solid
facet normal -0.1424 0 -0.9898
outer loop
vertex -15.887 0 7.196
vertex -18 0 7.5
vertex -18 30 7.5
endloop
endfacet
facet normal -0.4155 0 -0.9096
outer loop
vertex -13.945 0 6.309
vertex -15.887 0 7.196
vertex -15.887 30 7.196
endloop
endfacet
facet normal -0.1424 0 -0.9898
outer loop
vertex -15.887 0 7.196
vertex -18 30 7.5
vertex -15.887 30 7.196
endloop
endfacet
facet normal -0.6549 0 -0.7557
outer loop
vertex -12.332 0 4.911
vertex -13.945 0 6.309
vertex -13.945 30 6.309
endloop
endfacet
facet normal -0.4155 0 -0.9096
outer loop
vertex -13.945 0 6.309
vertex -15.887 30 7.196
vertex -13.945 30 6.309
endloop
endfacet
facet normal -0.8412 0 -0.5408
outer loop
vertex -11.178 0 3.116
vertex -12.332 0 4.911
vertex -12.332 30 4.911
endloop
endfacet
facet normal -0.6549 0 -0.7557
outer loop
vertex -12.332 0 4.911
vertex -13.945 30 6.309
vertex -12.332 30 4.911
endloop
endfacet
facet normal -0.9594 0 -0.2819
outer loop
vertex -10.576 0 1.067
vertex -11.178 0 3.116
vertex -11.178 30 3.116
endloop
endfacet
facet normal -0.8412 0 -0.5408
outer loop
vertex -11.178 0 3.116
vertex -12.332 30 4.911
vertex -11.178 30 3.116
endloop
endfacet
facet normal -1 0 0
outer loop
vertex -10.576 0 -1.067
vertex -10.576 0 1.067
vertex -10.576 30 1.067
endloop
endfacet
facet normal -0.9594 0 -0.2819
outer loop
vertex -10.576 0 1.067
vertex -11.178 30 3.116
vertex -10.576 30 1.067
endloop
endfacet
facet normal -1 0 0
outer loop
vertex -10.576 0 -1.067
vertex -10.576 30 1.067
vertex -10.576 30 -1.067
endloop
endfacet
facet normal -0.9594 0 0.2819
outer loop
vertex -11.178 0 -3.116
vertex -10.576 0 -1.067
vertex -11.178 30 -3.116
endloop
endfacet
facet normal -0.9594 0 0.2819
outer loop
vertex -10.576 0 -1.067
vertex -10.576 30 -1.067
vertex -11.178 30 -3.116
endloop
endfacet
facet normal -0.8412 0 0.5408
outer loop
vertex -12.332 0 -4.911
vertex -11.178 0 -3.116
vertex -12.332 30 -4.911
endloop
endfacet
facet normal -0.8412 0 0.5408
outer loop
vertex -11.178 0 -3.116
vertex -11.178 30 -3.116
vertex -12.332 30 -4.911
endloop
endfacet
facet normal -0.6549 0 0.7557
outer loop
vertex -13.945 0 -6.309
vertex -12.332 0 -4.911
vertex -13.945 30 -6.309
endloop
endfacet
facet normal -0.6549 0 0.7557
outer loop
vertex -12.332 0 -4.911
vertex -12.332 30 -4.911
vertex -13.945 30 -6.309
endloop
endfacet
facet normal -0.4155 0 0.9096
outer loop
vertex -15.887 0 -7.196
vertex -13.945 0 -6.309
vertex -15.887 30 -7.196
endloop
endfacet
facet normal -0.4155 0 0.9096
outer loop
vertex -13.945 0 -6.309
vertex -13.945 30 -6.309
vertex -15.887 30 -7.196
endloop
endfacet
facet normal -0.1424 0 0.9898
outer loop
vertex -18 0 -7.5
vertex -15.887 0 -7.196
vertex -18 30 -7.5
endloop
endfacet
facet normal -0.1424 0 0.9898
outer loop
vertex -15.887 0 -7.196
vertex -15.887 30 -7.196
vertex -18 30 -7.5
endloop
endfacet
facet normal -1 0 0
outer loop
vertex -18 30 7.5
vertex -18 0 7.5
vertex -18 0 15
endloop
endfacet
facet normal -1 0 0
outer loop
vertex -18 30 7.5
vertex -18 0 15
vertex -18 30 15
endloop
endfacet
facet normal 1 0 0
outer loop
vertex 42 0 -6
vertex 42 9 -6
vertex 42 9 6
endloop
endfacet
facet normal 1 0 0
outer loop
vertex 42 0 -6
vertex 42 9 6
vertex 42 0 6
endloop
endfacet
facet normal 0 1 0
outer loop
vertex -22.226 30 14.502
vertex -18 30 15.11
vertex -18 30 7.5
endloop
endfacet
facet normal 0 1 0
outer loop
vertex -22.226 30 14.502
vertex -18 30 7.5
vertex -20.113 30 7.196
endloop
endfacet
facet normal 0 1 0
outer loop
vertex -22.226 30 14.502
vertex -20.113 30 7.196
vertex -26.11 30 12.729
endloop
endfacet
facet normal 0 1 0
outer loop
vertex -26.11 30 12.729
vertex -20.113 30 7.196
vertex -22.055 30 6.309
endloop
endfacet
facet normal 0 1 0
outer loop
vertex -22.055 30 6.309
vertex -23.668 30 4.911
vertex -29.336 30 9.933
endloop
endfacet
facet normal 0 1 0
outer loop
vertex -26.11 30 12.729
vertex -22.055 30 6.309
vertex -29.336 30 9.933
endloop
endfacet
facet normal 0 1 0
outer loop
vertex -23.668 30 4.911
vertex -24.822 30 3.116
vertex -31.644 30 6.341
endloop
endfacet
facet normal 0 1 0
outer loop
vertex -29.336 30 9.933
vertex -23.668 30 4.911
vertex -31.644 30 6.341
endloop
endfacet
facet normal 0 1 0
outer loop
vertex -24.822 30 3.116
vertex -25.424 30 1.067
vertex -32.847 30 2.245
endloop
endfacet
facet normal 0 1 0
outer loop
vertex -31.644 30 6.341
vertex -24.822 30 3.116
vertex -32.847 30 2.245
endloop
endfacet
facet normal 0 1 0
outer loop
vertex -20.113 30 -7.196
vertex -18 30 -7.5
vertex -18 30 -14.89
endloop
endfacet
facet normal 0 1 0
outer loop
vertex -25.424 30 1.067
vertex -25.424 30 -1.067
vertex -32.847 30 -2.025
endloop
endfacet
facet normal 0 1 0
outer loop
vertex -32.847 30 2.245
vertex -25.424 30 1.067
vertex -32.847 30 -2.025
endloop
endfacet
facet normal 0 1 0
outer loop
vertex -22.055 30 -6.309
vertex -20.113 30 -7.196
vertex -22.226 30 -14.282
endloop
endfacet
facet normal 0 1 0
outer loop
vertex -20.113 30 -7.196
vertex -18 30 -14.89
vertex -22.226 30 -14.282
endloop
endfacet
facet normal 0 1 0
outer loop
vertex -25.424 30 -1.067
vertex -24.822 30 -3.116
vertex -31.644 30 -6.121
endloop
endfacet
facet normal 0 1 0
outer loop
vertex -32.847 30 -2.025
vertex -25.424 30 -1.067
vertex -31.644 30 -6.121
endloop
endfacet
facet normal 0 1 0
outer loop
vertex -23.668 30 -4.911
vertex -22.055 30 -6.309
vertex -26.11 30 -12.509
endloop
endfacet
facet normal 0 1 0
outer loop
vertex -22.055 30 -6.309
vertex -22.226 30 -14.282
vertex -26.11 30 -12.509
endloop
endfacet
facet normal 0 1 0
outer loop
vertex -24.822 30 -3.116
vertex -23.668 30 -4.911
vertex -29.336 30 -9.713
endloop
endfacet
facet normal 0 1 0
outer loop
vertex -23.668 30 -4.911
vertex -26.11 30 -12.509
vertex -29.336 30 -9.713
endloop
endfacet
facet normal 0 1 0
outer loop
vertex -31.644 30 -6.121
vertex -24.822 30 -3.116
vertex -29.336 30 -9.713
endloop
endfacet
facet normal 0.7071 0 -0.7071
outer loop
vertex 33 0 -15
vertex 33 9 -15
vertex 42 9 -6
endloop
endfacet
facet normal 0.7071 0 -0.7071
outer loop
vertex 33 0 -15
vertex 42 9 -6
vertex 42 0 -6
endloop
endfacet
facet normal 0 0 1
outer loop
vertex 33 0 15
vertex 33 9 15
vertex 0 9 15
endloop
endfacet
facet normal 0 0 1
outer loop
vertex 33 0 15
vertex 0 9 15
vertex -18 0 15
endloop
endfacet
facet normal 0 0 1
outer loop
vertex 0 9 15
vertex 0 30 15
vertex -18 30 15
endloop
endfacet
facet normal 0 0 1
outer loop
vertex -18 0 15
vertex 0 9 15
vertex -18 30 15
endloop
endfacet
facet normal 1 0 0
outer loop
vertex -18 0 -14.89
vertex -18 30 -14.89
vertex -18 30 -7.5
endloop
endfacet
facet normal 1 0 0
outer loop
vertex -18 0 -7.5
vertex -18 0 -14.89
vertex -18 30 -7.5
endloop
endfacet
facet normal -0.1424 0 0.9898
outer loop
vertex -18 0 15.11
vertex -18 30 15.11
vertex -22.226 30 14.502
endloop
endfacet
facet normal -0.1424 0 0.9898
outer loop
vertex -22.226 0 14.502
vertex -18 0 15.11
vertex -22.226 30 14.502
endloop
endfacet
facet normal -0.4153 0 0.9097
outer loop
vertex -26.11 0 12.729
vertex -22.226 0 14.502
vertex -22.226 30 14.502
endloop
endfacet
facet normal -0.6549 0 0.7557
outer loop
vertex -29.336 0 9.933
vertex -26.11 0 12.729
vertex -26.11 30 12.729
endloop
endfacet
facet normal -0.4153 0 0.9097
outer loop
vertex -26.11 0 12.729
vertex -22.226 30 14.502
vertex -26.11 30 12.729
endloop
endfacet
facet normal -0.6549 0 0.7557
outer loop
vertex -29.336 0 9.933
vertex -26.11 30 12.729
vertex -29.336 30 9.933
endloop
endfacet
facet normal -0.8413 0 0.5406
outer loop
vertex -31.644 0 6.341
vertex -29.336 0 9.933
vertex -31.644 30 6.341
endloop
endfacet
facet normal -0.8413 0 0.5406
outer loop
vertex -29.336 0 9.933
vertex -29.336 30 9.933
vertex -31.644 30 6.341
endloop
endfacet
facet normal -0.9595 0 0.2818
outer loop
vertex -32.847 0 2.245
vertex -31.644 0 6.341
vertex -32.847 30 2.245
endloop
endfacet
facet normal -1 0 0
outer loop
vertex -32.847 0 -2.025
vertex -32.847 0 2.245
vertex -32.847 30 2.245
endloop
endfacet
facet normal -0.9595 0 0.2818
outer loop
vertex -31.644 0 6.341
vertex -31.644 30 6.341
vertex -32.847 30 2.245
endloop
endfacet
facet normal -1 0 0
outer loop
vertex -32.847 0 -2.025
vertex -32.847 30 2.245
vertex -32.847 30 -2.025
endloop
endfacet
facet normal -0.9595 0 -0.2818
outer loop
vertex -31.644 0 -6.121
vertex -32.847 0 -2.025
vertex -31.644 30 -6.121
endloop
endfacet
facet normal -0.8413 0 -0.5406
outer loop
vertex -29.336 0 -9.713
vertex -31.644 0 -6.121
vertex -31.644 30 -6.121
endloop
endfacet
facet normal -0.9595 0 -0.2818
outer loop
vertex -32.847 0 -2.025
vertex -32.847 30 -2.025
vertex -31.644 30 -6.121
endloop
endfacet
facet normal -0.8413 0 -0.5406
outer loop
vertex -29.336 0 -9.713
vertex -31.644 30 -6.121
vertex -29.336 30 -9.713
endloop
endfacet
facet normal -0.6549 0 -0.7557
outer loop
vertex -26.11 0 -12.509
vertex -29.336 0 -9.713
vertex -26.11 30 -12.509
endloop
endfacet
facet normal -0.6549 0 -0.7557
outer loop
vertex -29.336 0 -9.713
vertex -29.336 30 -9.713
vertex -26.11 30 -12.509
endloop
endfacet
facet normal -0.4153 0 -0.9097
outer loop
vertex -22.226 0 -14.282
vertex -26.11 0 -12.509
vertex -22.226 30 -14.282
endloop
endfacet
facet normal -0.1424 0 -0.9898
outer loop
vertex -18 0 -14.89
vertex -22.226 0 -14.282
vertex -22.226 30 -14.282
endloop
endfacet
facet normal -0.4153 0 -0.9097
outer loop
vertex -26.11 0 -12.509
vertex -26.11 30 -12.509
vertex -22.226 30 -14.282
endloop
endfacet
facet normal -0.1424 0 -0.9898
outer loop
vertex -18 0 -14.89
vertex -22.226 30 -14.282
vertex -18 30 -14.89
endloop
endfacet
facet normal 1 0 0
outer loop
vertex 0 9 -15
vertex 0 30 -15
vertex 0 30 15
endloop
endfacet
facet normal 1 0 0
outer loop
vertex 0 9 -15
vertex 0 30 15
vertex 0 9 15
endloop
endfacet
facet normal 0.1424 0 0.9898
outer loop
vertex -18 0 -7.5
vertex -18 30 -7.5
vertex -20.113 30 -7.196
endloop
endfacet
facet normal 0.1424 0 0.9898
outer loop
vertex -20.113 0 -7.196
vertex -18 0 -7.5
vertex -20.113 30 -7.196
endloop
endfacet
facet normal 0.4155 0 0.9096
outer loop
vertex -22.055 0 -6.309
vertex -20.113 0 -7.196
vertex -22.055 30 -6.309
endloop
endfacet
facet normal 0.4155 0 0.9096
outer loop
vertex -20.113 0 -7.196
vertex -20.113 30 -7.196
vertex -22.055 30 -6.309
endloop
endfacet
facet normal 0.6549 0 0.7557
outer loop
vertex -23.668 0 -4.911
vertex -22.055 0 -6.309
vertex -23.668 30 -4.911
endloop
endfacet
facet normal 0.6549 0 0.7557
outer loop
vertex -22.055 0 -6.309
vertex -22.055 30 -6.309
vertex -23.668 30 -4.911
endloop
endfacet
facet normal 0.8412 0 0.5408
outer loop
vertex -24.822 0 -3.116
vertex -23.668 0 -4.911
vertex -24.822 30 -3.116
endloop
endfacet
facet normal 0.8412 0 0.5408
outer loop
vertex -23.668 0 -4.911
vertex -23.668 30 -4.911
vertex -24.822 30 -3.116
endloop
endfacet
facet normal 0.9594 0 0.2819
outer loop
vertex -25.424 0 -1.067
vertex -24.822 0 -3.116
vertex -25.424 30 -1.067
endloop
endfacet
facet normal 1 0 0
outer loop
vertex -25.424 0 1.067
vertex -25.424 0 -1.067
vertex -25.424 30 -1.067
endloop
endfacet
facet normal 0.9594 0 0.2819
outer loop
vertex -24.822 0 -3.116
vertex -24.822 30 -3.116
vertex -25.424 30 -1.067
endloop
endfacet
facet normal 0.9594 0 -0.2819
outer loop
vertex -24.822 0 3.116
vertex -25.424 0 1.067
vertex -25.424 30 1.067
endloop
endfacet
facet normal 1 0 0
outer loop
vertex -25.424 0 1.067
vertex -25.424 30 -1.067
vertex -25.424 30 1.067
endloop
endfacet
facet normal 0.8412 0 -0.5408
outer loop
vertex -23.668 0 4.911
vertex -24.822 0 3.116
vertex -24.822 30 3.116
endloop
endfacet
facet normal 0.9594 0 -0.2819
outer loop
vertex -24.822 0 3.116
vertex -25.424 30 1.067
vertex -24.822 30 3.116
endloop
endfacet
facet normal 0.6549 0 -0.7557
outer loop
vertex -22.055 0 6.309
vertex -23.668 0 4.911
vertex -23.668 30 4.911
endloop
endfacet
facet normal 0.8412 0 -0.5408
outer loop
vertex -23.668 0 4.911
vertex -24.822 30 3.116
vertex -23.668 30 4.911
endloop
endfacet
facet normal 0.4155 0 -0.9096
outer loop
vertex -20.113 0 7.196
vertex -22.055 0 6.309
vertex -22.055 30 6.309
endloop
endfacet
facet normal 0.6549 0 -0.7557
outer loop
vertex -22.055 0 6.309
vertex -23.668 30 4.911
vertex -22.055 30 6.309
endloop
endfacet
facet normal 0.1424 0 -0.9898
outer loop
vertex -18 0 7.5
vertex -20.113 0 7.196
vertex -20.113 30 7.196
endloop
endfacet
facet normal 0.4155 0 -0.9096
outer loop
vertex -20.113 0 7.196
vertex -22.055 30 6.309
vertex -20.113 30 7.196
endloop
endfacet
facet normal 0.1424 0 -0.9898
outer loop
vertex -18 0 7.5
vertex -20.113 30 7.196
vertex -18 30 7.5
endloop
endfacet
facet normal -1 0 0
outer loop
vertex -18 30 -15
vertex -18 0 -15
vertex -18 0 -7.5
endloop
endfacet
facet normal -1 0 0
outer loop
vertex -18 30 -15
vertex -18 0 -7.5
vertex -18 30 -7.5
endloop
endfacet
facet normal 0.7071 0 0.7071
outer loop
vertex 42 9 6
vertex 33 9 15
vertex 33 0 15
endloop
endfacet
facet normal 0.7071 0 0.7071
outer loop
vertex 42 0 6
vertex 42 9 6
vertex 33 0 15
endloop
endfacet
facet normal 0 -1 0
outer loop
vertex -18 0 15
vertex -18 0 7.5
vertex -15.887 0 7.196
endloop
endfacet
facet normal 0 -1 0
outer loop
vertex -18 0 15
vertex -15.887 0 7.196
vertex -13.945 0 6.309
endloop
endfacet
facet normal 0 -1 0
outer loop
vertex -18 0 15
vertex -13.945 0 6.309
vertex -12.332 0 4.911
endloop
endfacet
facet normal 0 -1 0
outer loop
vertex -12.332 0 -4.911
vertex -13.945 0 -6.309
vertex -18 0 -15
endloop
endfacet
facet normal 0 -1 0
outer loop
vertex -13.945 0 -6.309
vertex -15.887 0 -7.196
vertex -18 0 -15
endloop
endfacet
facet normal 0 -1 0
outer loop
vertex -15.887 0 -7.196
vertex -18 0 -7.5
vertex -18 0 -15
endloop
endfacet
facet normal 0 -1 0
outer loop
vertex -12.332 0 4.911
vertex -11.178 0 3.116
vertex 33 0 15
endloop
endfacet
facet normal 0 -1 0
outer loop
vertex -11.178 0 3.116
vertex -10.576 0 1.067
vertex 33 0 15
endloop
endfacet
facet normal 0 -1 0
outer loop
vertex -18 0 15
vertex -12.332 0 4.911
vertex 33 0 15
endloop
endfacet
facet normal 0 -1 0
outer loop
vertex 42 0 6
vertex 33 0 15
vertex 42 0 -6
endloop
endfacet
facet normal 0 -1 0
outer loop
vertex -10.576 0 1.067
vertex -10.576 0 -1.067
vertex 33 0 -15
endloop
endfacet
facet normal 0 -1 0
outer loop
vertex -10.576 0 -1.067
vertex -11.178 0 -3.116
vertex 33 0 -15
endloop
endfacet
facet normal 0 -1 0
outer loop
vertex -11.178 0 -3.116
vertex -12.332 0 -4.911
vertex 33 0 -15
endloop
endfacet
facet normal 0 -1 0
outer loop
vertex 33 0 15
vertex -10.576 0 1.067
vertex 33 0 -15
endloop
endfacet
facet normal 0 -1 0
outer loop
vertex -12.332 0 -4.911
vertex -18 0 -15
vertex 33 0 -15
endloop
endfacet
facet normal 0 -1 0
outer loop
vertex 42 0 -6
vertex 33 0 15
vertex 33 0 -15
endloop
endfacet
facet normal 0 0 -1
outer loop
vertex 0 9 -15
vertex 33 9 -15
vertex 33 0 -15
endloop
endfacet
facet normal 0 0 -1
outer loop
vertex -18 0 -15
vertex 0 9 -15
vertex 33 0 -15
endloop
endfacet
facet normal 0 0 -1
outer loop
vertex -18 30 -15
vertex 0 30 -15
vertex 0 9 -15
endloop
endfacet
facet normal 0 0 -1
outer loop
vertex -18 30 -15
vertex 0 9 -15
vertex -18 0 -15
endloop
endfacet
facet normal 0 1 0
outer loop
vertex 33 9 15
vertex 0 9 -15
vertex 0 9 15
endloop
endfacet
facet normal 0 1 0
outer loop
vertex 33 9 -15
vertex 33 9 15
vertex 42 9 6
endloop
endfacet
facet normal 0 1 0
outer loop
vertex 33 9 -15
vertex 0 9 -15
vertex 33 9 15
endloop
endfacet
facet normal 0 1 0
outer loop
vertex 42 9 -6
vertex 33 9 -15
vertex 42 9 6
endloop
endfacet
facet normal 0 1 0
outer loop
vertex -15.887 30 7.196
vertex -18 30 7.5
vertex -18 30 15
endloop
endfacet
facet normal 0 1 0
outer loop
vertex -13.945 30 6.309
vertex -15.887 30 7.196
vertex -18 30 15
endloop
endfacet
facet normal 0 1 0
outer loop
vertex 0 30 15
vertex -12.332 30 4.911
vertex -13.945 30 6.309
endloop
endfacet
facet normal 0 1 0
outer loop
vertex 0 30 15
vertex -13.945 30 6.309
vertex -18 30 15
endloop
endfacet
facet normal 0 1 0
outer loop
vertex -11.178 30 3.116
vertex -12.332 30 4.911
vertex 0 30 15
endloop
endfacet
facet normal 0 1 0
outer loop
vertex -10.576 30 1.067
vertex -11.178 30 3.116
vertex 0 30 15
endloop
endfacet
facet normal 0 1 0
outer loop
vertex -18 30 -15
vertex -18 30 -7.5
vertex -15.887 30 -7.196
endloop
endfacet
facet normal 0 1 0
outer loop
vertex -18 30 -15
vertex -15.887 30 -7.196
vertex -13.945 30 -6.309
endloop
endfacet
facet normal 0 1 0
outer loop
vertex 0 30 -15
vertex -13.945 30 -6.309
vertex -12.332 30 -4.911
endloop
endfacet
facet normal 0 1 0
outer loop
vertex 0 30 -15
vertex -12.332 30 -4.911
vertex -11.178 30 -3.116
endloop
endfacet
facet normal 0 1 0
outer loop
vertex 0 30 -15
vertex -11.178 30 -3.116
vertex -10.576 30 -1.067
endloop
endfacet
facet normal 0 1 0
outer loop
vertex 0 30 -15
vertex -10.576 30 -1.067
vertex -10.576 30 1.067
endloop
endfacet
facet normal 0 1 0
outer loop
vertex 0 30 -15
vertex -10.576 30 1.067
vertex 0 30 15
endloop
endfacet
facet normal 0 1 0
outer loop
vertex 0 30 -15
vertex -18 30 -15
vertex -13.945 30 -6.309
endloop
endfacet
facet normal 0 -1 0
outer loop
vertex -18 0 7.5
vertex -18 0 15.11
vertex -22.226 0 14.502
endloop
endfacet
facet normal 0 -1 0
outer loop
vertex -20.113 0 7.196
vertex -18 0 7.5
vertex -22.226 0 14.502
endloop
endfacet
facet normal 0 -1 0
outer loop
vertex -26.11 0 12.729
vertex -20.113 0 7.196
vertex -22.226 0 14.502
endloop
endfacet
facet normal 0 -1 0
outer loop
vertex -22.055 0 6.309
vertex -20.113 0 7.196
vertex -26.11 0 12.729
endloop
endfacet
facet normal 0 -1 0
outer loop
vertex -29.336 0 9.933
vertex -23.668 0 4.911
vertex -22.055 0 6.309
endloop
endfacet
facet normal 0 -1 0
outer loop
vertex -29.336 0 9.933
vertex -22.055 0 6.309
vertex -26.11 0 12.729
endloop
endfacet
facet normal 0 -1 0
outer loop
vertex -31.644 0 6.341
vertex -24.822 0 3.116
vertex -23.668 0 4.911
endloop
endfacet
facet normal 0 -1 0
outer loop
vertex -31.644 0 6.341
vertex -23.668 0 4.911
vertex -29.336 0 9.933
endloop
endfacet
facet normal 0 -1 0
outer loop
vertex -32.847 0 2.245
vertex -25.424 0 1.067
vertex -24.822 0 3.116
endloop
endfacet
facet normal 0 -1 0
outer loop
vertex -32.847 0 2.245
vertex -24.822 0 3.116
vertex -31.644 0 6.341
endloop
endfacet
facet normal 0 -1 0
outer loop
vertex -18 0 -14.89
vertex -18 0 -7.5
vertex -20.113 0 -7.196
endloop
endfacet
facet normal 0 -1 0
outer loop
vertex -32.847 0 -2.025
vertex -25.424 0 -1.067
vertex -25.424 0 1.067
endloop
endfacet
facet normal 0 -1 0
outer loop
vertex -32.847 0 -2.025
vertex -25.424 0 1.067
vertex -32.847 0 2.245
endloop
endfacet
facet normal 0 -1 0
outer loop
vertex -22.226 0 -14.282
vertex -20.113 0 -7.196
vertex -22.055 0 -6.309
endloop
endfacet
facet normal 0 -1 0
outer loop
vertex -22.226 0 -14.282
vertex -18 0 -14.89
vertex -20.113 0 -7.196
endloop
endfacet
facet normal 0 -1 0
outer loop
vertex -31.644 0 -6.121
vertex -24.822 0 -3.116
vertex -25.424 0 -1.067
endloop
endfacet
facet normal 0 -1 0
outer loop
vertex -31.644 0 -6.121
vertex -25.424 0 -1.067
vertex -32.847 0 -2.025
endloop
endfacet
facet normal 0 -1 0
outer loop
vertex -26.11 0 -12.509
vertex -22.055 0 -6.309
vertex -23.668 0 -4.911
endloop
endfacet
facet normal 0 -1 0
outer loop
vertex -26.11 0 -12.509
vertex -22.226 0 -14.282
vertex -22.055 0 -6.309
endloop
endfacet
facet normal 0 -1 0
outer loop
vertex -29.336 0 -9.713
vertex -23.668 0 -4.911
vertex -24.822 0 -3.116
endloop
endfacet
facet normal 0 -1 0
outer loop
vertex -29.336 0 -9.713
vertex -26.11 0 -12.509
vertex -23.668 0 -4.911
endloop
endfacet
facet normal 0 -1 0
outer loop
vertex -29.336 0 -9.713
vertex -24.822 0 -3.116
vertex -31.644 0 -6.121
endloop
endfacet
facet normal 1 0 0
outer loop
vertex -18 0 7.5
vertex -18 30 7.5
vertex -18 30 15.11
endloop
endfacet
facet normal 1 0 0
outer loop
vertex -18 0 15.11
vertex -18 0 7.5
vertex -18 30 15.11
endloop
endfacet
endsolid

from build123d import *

# Parameters (mm, degrees)
BOSS_EXTRUDE1_DEPTH      = 15
BOSS_EXTRUDE1_DEPTH_BACK = 15
BOSS_EXTRUDE2_DEPTH      = 30
CHAMFER1_SIZE            = 9
CHAMFER2_SIZE            = 9
SKETCH3_R                = 7.5
CUT_EXTRUDE2_DEPTH       = 54.780246911


with BuildPart() as part:
    # Sketch1 → Boss-Extrude1 (new, two sides: drawn at the far end of the back side and taken through both)
    with BuildSketch(Plane.XY.offset(-BOSS_EXTRUDE1_DEPTH_BACK)):
        Polygon((-18, 30), (0, 30), (0, 9), (42, 9), (42, 0), (0, 0), (-18, 0), align=None)
    extrude(amount=BOSS_EXTRUDE1_DEPTH + BOSS_EXTRUDE1_DEPTH_BACK)

    # Chamfer1
    chamfer1_edges = [part.edges().sort_by_distance(p)[0] for p in [
        (42, 4.5, 15),
    ]]
    chamfer(chamfer1_edges, length=CHAMFER1_SIZE)

    # Chamfer2
    chamfer2_edges = [part.edges().sort_by_distance(p)[0] for p in [
        (42, 4.5, -15),
    ]]
    chamfer(chamfer2_edges, length=CHAMFER2_SIZE)


with BuildPart() as body_2:
    # Sketch2 → Boss-Extrude2 (new body)
    with BuildSketch(Plane(origin=(0, 30, 0), x_dir=(1, 0, 0), z_dir=(0, 1, 0))):
        with BuildLine():
            Line((-18, 14.889905433), (-18, -15.110094567))
            ThreePointArc((-18, -15.110094567), (-33, -0.110094567), (-18, 14.889905433))
        make_face()
    extrude(amount=-BOSS_EXTRUDE2_DEPTH)


with BuildPart() as cut_extrude2_tool:
    # Sketch3 → Cut-Extrude2 (new, through all)
    with BuildSketch(Plane(origin=(0, 30, 0), x_dir=(1, 0, 0), z_dir=(0, 1, 0))):
        with Locations((-18, 0)):
            Circle(SKETCH3_R)
    extrude(amount=-CUT_EXTRUDE2_DEPTH)


with BuildPart() as part_1:
    add(part.part)

    # Cut-Extrude2: cut by cut_extrude2_tool
    add(cut_extrude2_tool.part, mode=Mode.SUBTRACT)


with BuildPart() as body_2_1:
    add(body_2.part)

    # Cut-Extrude2: cut by cut_extrude2_tool
    add(cut_extrude2_tool.part, mode=Mode.SUBTRACT)


solid = Compound([part_1.part, body_2_1.part])
